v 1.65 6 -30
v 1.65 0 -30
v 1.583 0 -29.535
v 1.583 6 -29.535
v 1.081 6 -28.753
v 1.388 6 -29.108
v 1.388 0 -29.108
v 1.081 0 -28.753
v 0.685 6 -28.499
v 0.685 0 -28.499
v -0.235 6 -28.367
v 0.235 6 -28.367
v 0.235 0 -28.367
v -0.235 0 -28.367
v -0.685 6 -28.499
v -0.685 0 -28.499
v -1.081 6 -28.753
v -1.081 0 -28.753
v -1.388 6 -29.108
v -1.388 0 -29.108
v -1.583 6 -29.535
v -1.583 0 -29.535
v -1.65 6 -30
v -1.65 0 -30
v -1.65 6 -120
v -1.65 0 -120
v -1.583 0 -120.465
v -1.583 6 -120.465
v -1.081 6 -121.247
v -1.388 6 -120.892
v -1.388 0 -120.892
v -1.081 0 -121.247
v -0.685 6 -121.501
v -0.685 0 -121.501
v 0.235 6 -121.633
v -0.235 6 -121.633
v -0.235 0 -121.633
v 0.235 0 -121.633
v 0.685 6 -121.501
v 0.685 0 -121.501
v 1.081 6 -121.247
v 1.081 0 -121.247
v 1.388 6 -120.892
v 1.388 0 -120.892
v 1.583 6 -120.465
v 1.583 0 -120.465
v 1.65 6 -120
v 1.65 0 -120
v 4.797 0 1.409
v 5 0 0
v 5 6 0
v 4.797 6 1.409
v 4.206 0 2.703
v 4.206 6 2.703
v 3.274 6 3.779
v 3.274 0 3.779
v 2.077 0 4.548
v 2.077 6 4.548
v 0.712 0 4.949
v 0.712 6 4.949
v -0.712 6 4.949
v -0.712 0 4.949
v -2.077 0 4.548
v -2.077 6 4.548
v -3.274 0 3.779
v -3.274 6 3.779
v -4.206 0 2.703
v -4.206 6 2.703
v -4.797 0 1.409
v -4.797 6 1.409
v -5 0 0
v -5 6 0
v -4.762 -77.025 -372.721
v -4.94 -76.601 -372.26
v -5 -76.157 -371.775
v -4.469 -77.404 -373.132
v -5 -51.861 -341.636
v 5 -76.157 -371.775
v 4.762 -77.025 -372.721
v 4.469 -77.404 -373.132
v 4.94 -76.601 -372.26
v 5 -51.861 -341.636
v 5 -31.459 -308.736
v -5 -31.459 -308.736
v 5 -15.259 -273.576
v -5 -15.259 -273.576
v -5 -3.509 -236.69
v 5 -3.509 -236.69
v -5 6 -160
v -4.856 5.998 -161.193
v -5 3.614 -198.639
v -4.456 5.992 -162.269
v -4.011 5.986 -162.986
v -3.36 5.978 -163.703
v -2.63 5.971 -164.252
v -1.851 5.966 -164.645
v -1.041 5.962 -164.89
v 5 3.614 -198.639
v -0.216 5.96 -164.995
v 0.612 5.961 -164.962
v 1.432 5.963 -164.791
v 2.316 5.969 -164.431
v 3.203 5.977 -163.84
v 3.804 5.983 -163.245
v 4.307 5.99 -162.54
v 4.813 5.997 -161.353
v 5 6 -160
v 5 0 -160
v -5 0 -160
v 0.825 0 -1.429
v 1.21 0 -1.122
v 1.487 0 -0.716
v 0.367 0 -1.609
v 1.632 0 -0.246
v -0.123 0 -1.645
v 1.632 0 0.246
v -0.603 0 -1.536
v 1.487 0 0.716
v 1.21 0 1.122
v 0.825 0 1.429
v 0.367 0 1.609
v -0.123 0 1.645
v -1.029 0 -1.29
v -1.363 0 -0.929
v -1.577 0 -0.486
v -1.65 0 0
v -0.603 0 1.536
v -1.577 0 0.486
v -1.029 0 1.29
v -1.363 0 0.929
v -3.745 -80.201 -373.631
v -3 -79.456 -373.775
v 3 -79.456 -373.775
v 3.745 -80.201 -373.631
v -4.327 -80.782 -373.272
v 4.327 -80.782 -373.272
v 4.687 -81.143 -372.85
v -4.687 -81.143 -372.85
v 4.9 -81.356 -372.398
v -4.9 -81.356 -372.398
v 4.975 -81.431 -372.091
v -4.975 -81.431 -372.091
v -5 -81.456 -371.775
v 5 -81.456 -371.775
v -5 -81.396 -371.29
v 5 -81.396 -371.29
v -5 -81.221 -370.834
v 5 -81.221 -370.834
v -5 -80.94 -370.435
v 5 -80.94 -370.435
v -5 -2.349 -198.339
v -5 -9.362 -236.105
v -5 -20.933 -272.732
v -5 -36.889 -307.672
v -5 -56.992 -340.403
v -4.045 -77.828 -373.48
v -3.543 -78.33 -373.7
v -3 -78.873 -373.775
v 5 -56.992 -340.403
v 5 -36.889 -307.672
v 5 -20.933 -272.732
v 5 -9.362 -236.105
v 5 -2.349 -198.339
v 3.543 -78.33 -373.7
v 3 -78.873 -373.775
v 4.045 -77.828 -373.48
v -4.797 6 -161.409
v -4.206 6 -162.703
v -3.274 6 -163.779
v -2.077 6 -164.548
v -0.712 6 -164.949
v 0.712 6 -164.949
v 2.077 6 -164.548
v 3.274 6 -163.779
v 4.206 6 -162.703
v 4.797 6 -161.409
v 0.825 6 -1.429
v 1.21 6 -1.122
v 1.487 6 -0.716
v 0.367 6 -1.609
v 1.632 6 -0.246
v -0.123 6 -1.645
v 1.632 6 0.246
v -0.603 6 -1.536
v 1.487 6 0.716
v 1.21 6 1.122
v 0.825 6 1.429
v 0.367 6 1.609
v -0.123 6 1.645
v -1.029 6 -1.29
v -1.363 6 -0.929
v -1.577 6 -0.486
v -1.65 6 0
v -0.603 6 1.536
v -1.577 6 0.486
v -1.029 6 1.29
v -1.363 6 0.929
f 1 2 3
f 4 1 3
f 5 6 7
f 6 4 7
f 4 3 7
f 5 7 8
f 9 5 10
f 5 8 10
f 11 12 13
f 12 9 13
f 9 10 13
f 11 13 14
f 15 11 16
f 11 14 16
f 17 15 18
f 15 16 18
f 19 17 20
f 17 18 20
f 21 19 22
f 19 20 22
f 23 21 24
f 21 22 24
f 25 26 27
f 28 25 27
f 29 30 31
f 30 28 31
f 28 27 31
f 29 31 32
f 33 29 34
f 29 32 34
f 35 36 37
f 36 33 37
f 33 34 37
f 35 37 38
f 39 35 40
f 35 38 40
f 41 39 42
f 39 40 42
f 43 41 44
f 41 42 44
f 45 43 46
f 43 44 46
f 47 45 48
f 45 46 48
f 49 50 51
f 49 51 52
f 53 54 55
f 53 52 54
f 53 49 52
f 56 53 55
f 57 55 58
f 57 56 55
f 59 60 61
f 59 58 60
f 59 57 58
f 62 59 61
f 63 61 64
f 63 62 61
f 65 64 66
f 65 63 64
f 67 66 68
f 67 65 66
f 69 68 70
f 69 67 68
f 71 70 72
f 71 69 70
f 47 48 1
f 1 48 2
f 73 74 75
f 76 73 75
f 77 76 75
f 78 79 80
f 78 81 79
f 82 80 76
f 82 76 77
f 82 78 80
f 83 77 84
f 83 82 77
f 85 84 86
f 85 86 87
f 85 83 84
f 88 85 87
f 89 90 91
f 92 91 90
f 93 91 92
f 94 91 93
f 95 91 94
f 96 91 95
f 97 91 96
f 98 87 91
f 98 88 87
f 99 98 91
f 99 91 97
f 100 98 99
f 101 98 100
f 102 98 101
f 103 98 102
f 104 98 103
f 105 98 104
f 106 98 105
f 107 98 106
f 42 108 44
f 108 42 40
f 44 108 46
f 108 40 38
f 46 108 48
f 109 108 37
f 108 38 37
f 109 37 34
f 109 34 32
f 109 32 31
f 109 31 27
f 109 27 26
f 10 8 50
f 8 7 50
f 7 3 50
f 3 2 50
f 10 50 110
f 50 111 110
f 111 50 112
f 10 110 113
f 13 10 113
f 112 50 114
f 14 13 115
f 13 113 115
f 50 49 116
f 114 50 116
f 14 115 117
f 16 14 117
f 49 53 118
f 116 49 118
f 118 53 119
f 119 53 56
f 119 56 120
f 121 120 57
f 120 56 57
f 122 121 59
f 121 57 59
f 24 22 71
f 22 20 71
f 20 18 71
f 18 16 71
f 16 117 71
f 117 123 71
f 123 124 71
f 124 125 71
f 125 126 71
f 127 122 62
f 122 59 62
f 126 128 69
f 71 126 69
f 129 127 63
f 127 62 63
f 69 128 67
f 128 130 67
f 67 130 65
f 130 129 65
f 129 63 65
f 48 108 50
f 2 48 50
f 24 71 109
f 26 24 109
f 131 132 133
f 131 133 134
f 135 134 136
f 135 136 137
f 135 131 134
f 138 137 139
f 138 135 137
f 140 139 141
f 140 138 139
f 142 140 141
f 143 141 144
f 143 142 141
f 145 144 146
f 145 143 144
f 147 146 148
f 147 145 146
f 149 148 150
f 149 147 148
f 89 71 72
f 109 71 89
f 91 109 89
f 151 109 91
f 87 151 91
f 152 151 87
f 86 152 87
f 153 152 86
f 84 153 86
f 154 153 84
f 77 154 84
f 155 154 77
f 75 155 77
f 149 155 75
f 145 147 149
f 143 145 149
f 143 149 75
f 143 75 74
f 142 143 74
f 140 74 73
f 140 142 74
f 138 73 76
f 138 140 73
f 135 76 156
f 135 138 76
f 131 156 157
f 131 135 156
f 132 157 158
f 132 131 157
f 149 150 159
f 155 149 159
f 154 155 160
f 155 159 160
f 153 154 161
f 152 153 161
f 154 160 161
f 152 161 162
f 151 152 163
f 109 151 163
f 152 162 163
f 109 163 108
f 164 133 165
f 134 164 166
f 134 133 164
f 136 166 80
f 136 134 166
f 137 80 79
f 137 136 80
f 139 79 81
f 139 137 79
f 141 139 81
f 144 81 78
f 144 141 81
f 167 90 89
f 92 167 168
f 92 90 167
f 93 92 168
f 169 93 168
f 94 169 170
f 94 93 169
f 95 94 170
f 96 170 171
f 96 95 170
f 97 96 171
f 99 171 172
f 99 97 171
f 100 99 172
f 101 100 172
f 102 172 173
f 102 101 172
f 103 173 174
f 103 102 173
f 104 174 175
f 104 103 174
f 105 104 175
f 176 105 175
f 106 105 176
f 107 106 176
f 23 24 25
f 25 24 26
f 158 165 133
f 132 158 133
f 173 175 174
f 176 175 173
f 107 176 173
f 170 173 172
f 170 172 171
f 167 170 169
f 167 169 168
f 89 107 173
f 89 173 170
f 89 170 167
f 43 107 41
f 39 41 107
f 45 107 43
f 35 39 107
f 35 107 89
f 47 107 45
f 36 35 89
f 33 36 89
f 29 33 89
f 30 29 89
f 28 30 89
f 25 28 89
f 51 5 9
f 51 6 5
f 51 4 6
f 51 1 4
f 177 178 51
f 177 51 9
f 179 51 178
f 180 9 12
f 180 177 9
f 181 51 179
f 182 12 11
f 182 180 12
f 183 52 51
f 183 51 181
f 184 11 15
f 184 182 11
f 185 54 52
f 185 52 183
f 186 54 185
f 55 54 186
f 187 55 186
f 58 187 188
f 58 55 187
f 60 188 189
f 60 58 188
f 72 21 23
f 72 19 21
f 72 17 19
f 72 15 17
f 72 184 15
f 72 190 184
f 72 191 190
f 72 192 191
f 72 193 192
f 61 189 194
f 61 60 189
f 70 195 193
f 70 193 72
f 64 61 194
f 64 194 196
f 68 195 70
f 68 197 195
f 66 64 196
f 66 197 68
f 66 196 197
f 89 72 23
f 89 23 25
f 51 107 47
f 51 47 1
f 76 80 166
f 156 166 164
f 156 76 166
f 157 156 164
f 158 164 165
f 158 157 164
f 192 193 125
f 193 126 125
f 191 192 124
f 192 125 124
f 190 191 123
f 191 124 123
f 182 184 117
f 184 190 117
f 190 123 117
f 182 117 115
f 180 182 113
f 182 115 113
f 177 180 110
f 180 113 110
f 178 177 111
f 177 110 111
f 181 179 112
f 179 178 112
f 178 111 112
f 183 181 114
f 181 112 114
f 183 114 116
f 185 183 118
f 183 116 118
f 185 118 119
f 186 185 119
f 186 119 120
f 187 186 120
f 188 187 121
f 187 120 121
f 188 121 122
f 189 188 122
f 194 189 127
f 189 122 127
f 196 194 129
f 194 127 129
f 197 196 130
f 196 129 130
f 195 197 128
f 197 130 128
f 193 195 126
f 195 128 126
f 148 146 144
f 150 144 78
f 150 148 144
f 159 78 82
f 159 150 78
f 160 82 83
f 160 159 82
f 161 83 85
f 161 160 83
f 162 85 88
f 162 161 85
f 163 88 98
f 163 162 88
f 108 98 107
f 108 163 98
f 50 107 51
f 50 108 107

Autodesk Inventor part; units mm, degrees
ref_plane "YZ Plane" through (0, 0, 0) normal (1, 0, 0) x (0, 1, 0)
ref_plane "XZ Plane" through (0, 0, 0) normal (0, 1, 0) x (-1, 0, 0)
ref_plane "XY Plane" through (0, 0, 0) normal (0, 0, 1) x (1, 0, 0)
sketch "Sketch1" plane through (0, 0, 0) normal (0, 1, 0) x (-1, 0, 0)
  line L0 (0, 0) -> (0, -160) construction
  line L1 (5, 0) -> (5, -160)
  line L2 (-5, -160) -> (-5, 0)
  arc A0 (5, 0) -> (-5, 0) centre (0, 0) ccw
  arc A1 (-5, -160) -> (5, -160) centre (0, -160) ccw
  circle A2 centre (0, 0) radius 1.65
  line L3 (0, -30) -> (0, -120) construction
  line L4 (1.65, -30) -> (1.65, -120)
  line L5 (-1.65, -120) -> (-1.65, -30)
  arc A3 (1.65, -30) -> (-1.65, -30) centre (0, -30) ccw
  arc A4 (-1.65, -120) -> (1.65, -120) centre (0, -120) ccw
  point P0 (0, -80)
  point P1 (0, -75)
  dimension "d0" = 160
  dimension "d1" = 10
  dimension "d2" = 3.3
  dimension "d3" = 30
  dimension "d5" = 120
  dimension "d6" = 3.3
extrude "Extrusion1" add sketch "Sketch1" along normal blind 6
sketch "Sketch2" plane through (5, 0, 0) normal (1, 0, 0) x (0, 0, -1)
  line L0 (160, 0) -> (160, 6) projected
  line L1 (0, 0) -> (160, 0) projected
  line L2 (160, 0) -> (160, 6) projected
  line L3 (0, 6) -> (160, 6) projected
  line L4 (0, 0) -> (0, 6) projected
  line L5 (160, 0) -> (160, 0) projected
  line L6 (160, 0) -> (160, 6) projected
  line L7 (160, 6) -> (160, 6) projected
  line L8 (160, 0) -> (160, 6) projected
  line L9 (160, 0) -> (0, 0) projected
  arc A0 (373.775, -84) -> (160, 0) centre (160, -314.0223) ccw
  line L10 (160, 6) -> (0, 6) projected
  arc A1 (373.775, -78) -> (160, 6) centre (160, -308.0223) ccw
  line L11 (373.775, -78) -> (373.775, -84)
  line L12 (0, 0) -> (160, 0) projected
  dimension "d9" = 6
  dimension "d10" = 373.775
  dimension "d11" = 90
extrude "Extrusion2" add sketch "Sketch2" against normal blind 10 contours L0 A1 L11 A0
fillet "Fillet1" radius 2 4 edges at (0, -78, -373.775) (5, -81, -373.775) (-5, -81, -373.775) (0, -84, -373.775)
